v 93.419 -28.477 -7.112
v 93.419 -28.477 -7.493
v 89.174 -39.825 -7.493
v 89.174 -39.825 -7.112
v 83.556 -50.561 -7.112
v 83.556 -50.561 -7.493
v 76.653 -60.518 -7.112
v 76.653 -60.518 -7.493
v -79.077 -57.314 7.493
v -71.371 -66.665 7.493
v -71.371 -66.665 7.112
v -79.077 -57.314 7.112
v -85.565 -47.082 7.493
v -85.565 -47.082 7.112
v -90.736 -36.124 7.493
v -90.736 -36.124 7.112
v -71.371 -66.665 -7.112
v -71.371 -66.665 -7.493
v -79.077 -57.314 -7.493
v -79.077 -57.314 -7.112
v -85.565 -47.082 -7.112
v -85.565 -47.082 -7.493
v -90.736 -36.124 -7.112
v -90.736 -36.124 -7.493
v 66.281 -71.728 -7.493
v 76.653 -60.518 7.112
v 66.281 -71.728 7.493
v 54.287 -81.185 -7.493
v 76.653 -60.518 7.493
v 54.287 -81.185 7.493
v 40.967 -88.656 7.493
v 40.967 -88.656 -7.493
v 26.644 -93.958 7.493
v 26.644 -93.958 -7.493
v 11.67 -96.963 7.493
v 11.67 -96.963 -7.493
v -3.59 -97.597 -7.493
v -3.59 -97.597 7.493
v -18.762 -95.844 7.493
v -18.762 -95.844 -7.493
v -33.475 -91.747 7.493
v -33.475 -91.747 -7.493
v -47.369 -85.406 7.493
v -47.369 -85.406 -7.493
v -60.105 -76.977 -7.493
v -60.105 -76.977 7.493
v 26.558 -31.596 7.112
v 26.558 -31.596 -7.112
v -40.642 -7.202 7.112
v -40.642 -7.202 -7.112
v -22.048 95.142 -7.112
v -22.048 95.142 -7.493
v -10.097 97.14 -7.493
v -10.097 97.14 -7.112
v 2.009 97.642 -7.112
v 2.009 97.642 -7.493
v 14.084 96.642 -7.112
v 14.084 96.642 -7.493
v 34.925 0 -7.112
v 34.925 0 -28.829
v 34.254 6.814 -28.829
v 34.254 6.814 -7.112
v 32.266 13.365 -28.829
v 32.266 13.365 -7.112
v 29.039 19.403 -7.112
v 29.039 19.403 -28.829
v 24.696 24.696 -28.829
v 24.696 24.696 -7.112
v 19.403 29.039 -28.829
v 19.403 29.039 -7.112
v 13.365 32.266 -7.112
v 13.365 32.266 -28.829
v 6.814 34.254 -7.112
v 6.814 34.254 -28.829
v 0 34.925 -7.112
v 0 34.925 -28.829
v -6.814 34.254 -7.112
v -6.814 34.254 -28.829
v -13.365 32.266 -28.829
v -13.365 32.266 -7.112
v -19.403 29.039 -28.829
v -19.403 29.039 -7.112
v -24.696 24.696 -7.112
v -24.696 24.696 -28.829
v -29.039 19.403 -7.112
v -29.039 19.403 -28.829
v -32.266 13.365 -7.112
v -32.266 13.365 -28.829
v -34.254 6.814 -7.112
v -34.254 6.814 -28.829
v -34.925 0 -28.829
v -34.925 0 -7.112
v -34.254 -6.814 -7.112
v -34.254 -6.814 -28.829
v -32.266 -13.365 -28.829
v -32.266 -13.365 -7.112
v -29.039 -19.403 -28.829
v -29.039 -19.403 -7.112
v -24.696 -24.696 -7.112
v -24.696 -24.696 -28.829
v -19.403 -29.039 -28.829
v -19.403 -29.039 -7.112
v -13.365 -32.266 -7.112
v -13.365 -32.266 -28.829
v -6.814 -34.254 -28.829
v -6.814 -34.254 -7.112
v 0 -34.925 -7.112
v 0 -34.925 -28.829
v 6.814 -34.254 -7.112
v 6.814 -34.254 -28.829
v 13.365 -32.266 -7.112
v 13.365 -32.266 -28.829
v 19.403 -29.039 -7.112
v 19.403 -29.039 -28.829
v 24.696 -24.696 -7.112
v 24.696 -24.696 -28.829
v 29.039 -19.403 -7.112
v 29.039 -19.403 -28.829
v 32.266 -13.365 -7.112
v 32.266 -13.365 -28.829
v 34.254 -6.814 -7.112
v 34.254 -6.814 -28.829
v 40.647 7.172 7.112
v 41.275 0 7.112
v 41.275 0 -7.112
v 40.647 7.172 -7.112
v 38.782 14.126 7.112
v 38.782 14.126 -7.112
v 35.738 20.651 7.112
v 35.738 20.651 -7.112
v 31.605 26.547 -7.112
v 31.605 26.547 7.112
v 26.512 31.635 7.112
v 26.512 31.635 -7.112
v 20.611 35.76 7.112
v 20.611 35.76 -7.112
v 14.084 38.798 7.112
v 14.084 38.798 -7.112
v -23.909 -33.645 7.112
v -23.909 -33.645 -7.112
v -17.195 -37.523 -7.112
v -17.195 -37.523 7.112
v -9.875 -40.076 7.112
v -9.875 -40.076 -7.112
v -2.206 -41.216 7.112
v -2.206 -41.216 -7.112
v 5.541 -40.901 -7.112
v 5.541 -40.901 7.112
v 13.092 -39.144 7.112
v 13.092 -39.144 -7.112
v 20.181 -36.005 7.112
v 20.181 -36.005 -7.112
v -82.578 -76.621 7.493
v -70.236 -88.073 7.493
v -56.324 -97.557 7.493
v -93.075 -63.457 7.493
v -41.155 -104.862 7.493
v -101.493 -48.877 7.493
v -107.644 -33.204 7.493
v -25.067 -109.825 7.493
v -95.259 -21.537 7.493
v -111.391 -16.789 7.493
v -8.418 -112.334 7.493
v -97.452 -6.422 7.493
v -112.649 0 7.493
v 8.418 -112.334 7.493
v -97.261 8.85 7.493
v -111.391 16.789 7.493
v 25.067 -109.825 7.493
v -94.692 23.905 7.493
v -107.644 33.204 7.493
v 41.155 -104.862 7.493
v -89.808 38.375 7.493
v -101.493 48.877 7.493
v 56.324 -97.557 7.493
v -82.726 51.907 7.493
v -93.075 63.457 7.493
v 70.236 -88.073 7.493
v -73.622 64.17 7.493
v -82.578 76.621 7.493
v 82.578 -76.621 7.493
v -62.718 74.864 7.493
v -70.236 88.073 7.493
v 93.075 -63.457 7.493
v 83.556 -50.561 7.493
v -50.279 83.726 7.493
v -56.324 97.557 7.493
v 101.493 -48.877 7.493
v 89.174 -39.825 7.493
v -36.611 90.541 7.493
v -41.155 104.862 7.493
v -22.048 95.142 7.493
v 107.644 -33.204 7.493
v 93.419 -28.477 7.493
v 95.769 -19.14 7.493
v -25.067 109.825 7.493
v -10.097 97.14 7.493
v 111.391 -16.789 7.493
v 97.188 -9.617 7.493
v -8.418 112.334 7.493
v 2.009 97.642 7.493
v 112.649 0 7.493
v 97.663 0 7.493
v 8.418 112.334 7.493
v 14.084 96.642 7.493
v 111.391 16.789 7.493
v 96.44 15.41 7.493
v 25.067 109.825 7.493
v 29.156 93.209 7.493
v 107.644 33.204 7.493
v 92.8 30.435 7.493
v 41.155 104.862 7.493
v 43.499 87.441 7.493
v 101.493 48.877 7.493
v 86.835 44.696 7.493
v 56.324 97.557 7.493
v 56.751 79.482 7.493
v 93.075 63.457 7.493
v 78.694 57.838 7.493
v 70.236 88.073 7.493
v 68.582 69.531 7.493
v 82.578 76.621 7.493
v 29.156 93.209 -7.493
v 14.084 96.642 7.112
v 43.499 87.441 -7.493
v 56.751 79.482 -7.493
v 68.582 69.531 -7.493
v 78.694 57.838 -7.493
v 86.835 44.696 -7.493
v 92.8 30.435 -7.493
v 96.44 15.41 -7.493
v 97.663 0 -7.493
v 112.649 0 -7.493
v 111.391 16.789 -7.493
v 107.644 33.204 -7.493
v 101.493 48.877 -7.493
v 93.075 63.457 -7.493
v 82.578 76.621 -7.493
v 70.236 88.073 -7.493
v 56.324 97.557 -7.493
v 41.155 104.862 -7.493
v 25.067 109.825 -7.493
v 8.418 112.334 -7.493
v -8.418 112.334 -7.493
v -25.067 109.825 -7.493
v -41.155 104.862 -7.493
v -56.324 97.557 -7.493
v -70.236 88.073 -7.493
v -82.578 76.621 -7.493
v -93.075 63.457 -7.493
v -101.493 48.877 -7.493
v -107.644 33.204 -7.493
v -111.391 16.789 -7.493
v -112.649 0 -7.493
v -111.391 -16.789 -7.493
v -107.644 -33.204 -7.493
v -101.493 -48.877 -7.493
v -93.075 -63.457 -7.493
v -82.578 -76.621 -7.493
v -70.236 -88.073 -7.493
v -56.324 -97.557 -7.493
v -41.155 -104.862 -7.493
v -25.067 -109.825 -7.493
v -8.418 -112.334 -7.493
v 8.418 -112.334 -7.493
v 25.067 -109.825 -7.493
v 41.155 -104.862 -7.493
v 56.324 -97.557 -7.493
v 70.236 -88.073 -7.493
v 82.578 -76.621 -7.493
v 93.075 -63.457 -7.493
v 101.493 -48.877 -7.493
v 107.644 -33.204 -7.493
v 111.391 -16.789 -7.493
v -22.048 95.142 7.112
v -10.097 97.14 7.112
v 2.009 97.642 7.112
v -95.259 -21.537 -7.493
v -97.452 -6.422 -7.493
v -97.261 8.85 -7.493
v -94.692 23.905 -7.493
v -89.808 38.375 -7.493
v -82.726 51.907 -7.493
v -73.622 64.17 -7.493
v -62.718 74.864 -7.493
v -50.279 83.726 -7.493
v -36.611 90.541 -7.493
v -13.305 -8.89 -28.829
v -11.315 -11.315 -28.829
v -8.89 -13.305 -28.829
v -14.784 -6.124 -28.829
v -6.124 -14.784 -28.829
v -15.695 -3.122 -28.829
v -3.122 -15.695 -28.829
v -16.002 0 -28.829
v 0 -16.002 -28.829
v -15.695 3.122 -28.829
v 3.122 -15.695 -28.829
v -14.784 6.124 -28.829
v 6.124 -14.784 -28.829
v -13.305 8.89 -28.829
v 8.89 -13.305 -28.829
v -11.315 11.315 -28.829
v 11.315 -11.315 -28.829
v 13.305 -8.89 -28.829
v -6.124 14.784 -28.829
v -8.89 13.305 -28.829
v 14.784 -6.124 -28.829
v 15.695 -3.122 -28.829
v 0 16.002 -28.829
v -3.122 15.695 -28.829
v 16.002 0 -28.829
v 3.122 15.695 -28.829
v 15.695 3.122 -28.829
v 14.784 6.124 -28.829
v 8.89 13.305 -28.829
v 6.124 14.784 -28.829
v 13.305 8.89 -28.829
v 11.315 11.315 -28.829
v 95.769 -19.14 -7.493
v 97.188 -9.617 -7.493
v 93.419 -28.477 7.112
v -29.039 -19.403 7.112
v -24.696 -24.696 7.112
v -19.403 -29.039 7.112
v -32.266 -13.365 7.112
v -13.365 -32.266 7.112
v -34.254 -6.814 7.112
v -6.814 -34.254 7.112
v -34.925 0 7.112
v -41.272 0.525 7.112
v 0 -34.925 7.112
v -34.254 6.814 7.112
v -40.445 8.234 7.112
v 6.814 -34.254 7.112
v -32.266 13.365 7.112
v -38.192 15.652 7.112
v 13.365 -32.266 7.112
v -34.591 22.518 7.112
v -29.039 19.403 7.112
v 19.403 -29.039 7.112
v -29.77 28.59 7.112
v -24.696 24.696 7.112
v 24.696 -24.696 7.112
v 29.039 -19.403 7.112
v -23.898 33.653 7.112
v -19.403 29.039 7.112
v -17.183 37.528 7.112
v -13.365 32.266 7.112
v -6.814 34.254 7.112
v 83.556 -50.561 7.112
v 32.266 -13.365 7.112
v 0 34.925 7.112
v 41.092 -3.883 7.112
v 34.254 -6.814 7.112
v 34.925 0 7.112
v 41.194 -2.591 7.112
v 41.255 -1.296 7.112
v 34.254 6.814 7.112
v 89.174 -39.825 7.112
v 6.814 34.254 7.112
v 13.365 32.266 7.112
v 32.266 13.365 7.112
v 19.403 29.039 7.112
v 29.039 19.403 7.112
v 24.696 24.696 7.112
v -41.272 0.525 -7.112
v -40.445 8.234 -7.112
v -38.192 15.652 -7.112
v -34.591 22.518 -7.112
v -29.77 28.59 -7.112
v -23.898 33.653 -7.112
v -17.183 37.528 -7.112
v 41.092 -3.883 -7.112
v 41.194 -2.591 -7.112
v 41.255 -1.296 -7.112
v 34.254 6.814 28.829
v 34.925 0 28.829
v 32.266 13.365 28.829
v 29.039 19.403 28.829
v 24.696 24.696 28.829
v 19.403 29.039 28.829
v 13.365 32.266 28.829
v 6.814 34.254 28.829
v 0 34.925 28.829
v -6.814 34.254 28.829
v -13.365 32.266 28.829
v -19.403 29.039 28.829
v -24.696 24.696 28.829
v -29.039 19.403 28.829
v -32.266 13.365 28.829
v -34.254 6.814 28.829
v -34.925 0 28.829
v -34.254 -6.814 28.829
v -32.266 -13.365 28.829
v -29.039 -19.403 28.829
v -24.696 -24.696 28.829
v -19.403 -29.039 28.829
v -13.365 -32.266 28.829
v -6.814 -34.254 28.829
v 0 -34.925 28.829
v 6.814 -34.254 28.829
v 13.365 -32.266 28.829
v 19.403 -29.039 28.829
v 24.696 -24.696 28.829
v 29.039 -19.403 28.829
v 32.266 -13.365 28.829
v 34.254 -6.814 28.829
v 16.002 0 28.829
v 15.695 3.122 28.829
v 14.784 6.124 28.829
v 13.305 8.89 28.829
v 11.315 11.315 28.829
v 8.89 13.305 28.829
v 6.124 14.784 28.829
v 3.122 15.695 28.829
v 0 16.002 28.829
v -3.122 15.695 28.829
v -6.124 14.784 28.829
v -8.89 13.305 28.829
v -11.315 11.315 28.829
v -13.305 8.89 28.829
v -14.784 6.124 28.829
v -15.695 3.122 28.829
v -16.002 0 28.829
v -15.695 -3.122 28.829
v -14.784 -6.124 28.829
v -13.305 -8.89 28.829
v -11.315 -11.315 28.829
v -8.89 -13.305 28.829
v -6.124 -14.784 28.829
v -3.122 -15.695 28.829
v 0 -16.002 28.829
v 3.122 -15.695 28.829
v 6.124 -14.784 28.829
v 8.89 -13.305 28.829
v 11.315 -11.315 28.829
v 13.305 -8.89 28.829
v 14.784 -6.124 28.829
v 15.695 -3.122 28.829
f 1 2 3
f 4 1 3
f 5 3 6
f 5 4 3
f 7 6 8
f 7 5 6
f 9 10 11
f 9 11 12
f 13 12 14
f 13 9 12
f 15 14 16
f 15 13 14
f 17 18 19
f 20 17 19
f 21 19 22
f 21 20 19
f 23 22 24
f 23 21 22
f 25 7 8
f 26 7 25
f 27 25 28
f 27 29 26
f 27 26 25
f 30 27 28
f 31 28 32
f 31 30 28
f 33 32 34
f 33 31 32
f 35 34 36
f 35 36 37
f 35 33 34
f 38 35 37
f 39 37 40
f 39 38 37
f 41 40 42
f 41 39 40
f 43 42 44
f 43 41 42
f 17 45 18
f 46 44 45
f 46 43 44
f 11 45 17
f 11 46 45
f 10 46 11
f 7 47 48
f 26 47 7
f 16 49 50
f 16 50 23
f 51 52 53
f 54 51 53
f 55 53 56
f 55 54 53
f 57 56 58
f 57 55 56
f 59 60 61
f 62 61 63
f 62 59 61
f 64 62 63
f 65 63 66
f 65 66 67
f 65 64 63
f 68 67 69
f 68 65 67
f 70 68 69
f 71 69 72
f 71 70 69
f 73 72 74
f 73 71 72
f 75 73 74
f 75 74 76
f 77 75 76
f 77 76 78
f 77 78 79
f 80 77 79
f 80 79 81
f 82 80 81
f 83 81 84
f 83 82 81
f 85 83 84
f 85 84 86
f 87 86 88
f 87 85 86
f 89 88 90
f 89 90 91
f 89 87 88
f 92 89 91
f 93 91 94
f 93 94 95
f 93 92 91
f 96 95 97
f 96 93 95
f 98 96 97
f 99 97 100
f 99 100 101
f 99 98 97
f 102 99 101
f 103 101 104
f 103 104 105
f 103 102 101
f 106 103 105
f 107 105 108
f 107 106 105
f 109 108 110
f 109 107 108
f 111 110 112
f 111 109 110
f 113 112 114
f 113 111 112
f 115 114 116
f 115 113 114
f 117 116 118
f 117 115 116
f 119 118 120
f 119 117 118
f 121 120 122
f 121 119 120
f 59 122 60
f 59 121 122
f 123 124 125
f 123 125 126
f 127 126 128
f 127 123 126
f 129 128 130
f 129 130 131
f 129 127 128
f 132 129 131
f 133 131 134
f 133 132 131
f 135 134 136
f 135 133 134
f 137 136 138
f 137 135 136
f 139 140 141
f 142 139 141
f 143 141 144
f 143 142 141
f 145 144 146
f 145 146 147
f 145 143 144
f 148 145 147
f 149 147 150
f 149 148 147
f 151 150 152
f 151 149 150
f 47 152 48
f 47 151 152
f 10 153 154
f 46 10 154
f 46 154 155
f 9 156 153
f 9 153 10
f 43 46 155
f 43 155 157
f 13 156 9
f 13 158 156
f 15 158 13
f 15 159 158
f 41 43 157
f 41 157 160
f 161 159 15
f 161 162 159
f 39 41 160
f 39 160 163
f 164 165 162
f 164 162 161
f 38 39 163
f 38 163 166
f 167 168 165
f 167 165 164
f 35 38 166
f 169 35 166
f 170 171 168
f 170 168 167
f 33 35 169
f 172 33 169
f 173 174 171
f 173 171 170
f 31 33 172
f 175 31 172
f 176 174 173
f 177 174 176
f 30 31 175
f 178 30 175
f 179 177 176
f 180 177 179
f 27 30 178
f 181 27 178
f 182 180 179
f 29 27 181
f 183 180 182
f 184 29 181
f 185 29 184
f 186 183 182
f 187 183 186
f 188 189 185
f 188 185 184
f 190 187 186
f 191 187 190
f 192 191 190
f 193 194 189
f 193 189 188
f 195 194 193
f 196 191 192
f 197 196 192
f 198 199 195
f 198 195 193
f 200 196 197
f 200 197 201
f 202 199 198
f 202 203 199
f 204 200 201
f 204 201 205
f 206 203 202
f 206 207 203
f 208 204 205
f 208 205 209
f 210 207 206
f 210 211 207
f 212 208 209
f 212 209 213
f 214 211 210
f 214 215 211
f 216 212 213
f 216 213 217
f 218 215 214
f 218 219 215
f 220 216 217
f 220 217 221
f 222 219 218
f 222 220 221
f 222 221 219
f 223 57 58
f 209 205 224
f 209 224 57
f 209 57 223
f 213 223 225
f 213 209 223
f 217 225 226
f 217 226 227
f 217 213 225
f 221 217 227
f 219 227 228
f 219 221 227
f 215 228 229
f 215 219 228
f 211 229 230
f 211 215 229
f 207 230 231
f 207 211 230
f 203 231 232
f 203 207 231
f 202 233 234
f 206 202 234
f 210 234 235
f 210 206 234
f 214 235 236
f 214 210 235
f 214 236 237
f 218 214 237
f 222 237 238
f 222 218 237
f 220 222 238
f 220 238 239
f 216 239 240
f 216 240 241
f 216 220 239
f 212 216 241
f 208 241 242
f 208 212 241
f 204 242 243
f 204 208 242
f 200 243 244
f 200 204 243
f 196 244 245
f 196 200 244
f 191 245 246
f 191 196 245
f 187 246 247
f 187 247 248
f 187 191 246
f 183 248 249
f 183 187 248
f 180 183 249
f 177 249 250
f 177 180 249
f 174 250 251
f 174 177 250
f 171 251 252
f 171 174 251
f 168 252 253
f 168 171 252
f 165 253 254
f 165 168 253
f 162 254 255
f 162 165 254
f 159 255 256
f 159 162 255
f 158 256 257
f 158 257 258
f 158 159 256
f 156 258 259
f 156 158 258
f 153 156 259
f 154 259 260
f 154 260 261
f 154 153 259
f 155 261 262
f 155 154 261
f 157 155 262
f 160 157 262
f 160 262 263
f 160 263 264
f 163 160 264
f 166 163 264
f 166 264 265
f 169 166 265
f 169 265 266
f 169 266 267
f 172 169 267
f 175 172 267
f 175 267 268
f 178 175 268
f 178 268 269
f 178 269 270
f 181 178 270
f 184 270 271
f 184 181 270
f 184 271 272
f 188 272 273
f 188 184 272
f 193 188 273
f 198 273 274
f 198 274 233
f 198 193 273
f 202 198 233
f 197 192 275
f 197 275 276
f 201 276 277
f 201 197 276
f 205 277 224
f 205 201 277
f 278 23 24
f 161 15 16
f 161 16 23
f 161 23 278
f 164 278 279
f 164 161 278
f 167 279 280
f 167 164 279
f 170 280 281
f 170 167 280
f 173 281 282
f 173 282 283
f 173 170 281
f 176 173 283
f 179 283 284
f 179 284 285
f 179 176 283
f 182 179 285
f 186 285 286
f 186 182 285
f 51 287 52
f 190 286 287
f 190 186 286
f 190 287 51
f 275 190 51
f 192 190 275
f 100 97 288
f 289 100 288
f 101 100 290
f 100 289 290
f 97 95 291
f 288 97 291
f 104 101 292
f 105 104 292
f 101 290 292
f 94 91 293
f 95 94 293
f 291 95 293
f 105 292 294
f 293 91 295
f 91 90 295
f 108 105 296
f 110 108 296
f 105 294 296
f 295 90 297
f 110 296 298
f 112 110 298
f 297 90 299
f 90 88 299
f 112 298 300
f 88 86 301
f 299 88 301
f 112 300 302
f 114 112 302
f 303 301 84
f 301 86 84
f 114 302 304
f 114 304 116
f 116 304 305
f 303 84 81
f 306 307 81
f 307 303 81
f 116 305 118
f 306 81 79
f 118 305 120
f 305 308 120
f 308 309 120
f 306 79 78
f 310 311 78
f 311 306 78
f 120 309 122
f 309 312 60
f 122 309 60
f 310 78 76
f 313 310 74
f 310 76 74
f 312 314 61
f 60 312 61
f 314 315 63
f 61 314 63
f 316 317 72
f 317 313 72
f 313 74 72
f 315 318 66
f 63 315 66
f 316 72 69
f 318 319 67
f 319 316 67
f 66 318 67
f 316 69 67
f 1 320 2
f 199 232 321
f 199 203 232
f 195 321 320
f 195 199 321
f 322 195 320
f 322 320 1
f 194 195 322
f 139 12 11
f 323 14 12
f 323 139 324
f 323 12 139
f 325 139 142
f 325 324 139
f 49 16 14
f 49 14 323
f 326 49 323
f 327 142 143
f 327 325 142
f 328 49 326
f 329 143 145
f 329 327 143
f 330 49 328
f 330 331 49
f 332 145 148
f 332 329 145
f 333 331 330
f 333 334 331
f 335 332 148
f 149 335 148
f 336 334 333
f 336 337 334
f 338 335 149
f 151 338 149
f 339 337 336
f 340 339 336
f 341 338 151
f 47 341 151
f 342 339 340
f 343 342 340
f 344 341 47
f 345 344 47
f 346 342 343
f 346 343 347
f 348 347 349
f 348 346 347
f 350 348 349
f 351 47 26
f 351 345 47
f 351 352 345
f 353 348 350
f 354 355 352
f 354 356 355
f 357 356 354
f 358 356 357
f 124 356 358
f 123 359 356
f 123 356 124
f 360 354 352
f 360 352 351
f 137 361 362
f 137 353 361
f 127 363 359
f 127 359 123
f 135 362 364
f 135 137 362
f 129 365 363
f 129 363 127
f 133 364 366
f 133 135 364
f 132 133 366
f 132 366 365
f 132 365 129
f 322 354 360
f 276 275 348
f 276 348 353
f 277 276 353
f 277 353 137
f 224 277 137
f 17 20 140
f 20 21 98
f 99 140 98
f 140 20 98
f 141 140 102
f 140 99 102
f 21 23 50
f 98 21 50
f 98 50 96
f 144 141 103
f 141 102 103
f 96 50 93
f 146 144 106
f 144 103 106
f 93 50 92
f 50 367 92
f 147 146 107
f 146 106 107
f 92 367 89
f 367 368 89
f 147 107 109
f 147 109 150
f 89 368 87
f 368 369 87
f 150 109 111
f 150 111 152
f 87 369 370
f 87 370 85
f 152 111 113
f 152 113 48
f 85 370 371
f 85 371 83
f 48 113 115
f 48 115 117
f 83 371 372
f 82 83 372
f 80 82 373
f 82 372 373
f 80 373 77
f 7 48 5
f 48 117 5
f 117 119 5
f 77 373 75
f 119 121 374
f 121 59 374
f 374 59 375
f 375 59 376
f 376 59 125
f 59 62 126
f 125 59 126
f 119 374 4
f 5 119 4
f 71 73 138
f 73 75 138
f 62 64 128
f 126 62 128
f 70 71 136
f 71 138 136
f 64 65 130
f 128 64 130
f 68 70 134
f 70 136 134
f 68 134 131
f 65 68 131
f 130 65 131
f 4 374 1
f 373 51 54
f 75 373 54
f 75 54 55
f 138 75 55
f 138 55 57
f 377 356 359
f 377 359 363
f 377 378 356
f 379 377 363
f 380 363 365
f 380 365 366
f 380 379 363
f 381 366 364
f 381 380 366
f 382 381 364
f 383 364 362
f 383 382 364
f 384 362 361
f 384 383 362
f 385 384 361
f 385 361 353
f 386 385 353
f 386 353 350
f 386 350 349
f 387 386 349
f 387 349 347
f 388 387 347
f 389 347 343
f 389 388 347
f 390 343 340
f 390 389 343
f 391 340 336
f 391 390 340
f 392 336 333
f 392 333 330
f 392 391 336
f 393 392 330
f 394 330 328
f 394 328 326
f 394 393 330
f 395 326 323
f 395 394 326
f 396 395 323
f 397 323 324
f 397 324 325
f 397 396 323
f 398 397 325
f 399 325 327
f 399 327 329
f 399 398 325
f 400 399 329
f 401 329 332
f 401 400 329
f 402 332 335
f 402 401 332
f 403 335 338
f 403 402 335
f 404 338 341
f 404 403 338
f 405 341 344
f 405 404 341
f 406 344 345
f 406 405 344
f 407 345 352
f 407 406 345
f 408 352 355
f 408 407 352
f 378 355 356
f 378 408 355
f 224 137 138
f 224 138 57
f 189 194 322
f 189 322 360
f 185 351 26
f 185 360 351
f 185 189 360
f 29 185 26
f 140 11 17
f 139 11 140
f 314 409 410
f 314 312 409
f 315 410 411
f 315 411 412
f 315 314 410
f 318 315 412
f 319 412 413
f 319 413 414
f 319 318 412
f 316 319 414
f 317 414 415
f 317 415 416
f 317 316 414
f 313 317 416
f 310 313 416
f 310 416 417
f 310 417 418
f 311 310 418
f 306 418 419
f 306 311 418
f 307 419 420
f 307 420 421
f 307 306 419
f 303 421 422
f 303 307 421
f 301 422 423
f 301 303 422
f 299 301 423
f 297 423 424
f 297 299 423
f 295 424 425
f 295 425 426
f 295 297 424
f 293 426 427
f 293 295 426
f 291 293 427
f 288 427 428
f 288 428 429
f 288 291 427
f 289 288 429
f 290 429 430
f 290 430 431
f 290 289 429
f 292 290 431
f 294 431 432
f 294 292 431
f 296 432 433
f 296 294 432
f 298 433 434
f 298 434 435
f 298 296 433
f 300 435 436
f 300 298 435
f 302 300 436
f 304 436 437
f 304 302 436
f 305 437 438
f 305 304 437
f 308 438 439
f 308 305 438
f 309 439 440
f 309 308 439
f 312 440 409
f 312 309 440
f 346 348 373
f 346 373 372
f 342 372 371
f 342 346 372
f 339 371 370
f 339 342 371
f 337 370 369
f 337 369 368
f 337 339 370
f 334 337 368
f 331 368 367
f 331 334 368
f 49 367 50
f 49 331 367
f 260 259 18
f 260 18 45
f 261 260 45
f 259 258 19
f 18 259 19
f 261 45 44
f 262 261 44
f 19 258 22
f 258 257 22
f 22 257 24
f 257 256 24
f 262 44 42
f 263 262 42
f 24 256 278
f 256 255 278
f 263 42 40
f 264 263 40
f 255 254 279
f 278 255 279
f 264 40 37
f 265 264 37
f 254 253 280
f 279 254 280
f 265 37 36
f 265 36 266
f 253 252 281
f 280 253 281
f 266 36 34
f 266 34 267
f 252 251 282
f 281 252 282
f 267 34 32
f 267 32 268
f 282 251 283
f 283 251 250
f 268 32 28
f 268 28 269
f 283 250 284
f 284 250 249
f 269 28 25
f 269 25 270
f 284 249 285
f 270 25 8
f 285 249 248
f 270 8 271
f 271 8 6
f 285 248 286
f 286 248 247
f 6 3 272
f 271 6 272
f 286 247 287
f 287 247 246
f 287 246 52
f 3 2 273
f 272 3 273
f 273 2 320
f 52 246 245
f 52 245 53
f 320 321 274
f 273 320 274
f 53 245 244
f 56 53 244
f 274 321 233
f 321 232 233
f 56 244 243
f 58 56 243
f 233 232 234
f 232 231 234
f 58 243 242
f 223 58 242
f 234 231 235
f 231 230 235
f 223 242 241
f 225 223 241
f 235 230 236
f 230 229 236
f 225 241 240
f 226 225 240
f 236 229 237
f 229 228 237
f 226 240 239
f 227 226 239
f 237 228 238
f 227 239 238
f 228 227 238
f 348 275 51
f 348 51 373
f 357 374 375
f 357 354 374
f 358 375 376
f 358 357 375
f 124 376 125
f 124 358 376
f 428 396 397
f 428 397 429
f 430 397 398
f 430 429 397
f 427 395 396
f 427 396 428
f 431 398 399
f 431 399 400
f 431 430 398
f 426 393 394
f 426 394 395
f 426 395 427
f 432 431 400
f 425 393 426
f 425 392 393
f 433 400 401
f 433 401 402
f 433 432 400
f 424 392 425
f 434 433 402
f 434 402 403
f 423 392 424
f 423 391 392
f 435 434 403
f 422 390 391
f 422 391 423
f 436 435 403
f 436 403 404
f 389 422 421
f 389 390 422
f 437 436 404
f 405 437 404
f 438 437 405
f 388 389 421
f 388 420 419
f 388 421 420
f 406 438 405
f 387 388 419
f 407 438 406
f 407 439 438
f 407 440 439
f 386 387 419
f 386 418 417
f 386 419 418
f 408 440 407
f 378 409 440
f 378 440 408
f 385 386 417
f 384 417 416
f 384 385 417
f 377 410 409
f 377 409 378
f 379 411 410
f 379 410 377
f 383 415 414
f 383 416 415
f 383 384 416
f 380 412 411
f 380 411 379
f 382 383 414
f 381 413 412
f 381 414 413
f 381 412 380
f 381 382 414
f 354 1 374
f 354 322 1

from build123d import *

# Parameters (mm, degrees)
F0_R     = 34.925
F0_R_2   = 16.002
F1_DEPTH = 28.829
F2_DEPTH = 7.112
F0_R_3   = 112.649
F3_DEPTH = 7.493


with BuildPart() as f1:
    # F0 (on Top) → F1 (new body, symmetric)
    with BuildSketch(Plane.XY):
        Circle(F0_R)
        Circle(F0_R_2, mode=Mode.SUBTRACT)
    extrude(amount=F1_DEPTH, both=True)

    # F0 (on Top) → F2 (join, symmetric)
    with BuildSketch(Plane.XY):
        with BuildLine():
            ThreePointArc((41.091917, -3.883291), (41.229204, -1.943802), (41.275, 0))
            ThreePointArc((41.275, 0), (33.800319, 23.688901), (14.083526, 38.797937))
            ThreePointArc((14.083526, 38.797937), (-1.674687, 41.241012), (-17.18293, 37.52829))
            ThreePointArc((-17.18293, 37.52829), (-36.553107, 19.170184), (-40.641762, -7.202277))
            ThreePointArc((-40.641762, -7.202277), (-34.87842, -22.070827), (-23.908987, -33.644999))
            ThreePointArc((-23.908987, -33.644999), (1.674687, -41.241012), (26.558236, -31.59566))
            ThreePointArc((26.558236, -31.59566), (36.553107, -19.170184), (41.091917, -3.883291))
        make_face()
        Circle(F0_R, mode=Mode.SUBTRACT)
        with BuildLine():
            ThreePointArc((-17.18293, 37.52829), (-1.674687, 41.241012), (14.083526, 38.797937))
            Line((14.083526, 38.797937), (14.083526, 96.642205))
            ThreePointArc((14.083526, 96.642205), (-4.052266, 97.578895), (-22.047948, 95.141734))
            Line((-22.047948, 95.141734), (-17.18293, 37.52829))
        make_face()
        with BuildLine():
            ThreePointArc((-23.908987, -33.644999), (-34.87842, -22.070827), (-40.641762, -7.202277))
            Line((-40.641762, -7.202277), (-90.736368, -36.124411))
            ThreePointArc((-90.736368, -36.124411), (-82.479669, -52.298813), (-71.371184, -66.66495))
            Line((-71.371184, -66.66495), (-23.908987, -33.644999))
        make_face()
        with BuildLine():
            Line((93.419133, -28.476784), (41.091917, -3.883291))
            ThreePointArc((41.091917, -3.883291), (36.553107, -19.170184), (26.558236, -31.59566))
            Line((26.558236, -31.59566), (76.652842, -60.517794))
            ThreePointArc((76.652842, -60.517794), (86.531935, -45.280082), (93.419133, -28.476784))
        make_face()
    extrude(amount=F2_DEPTH, both=True)

    # F0 (on Top) → F3 (join, symmetric)
    with BuildSketch(Plane.XY):
        Circle(F0_R_3)
        with BuildLine():
            ThreePointArc((-22.047948, 95.141734), (-4.052266, 97.578895), (14.083526, 96.642205))
            ThreePointArc((14.083526, 96.642205), (73.869821, 63.88514), (97.663, 0))
            ThreePointArc((97.663, 0), (96.596207, -14.395638), (93.419133, -28.476784))
            ThreePointArc((93.419133, -28.476784), (86.531935, -45.280082), (76.652842, -60.517794))
            ThreePointArc((76.652842, -60.517794), (4.052266, -97.578895), (-71.371184, -66.66495))
            ThreePointArc((-71.371184, -66.66495), (-82.479669, -52.298813), (-90.736368, -36.124411))
            ThreePointArc((-90.736368, -36.124411), (-86.531935, 45.280082), (-22.047948, 95.141734))
        make_face(mode=Mode.SUBTRACT)
    extrude(amount=F3_DEPTH, both=True)


solid = f1.part
